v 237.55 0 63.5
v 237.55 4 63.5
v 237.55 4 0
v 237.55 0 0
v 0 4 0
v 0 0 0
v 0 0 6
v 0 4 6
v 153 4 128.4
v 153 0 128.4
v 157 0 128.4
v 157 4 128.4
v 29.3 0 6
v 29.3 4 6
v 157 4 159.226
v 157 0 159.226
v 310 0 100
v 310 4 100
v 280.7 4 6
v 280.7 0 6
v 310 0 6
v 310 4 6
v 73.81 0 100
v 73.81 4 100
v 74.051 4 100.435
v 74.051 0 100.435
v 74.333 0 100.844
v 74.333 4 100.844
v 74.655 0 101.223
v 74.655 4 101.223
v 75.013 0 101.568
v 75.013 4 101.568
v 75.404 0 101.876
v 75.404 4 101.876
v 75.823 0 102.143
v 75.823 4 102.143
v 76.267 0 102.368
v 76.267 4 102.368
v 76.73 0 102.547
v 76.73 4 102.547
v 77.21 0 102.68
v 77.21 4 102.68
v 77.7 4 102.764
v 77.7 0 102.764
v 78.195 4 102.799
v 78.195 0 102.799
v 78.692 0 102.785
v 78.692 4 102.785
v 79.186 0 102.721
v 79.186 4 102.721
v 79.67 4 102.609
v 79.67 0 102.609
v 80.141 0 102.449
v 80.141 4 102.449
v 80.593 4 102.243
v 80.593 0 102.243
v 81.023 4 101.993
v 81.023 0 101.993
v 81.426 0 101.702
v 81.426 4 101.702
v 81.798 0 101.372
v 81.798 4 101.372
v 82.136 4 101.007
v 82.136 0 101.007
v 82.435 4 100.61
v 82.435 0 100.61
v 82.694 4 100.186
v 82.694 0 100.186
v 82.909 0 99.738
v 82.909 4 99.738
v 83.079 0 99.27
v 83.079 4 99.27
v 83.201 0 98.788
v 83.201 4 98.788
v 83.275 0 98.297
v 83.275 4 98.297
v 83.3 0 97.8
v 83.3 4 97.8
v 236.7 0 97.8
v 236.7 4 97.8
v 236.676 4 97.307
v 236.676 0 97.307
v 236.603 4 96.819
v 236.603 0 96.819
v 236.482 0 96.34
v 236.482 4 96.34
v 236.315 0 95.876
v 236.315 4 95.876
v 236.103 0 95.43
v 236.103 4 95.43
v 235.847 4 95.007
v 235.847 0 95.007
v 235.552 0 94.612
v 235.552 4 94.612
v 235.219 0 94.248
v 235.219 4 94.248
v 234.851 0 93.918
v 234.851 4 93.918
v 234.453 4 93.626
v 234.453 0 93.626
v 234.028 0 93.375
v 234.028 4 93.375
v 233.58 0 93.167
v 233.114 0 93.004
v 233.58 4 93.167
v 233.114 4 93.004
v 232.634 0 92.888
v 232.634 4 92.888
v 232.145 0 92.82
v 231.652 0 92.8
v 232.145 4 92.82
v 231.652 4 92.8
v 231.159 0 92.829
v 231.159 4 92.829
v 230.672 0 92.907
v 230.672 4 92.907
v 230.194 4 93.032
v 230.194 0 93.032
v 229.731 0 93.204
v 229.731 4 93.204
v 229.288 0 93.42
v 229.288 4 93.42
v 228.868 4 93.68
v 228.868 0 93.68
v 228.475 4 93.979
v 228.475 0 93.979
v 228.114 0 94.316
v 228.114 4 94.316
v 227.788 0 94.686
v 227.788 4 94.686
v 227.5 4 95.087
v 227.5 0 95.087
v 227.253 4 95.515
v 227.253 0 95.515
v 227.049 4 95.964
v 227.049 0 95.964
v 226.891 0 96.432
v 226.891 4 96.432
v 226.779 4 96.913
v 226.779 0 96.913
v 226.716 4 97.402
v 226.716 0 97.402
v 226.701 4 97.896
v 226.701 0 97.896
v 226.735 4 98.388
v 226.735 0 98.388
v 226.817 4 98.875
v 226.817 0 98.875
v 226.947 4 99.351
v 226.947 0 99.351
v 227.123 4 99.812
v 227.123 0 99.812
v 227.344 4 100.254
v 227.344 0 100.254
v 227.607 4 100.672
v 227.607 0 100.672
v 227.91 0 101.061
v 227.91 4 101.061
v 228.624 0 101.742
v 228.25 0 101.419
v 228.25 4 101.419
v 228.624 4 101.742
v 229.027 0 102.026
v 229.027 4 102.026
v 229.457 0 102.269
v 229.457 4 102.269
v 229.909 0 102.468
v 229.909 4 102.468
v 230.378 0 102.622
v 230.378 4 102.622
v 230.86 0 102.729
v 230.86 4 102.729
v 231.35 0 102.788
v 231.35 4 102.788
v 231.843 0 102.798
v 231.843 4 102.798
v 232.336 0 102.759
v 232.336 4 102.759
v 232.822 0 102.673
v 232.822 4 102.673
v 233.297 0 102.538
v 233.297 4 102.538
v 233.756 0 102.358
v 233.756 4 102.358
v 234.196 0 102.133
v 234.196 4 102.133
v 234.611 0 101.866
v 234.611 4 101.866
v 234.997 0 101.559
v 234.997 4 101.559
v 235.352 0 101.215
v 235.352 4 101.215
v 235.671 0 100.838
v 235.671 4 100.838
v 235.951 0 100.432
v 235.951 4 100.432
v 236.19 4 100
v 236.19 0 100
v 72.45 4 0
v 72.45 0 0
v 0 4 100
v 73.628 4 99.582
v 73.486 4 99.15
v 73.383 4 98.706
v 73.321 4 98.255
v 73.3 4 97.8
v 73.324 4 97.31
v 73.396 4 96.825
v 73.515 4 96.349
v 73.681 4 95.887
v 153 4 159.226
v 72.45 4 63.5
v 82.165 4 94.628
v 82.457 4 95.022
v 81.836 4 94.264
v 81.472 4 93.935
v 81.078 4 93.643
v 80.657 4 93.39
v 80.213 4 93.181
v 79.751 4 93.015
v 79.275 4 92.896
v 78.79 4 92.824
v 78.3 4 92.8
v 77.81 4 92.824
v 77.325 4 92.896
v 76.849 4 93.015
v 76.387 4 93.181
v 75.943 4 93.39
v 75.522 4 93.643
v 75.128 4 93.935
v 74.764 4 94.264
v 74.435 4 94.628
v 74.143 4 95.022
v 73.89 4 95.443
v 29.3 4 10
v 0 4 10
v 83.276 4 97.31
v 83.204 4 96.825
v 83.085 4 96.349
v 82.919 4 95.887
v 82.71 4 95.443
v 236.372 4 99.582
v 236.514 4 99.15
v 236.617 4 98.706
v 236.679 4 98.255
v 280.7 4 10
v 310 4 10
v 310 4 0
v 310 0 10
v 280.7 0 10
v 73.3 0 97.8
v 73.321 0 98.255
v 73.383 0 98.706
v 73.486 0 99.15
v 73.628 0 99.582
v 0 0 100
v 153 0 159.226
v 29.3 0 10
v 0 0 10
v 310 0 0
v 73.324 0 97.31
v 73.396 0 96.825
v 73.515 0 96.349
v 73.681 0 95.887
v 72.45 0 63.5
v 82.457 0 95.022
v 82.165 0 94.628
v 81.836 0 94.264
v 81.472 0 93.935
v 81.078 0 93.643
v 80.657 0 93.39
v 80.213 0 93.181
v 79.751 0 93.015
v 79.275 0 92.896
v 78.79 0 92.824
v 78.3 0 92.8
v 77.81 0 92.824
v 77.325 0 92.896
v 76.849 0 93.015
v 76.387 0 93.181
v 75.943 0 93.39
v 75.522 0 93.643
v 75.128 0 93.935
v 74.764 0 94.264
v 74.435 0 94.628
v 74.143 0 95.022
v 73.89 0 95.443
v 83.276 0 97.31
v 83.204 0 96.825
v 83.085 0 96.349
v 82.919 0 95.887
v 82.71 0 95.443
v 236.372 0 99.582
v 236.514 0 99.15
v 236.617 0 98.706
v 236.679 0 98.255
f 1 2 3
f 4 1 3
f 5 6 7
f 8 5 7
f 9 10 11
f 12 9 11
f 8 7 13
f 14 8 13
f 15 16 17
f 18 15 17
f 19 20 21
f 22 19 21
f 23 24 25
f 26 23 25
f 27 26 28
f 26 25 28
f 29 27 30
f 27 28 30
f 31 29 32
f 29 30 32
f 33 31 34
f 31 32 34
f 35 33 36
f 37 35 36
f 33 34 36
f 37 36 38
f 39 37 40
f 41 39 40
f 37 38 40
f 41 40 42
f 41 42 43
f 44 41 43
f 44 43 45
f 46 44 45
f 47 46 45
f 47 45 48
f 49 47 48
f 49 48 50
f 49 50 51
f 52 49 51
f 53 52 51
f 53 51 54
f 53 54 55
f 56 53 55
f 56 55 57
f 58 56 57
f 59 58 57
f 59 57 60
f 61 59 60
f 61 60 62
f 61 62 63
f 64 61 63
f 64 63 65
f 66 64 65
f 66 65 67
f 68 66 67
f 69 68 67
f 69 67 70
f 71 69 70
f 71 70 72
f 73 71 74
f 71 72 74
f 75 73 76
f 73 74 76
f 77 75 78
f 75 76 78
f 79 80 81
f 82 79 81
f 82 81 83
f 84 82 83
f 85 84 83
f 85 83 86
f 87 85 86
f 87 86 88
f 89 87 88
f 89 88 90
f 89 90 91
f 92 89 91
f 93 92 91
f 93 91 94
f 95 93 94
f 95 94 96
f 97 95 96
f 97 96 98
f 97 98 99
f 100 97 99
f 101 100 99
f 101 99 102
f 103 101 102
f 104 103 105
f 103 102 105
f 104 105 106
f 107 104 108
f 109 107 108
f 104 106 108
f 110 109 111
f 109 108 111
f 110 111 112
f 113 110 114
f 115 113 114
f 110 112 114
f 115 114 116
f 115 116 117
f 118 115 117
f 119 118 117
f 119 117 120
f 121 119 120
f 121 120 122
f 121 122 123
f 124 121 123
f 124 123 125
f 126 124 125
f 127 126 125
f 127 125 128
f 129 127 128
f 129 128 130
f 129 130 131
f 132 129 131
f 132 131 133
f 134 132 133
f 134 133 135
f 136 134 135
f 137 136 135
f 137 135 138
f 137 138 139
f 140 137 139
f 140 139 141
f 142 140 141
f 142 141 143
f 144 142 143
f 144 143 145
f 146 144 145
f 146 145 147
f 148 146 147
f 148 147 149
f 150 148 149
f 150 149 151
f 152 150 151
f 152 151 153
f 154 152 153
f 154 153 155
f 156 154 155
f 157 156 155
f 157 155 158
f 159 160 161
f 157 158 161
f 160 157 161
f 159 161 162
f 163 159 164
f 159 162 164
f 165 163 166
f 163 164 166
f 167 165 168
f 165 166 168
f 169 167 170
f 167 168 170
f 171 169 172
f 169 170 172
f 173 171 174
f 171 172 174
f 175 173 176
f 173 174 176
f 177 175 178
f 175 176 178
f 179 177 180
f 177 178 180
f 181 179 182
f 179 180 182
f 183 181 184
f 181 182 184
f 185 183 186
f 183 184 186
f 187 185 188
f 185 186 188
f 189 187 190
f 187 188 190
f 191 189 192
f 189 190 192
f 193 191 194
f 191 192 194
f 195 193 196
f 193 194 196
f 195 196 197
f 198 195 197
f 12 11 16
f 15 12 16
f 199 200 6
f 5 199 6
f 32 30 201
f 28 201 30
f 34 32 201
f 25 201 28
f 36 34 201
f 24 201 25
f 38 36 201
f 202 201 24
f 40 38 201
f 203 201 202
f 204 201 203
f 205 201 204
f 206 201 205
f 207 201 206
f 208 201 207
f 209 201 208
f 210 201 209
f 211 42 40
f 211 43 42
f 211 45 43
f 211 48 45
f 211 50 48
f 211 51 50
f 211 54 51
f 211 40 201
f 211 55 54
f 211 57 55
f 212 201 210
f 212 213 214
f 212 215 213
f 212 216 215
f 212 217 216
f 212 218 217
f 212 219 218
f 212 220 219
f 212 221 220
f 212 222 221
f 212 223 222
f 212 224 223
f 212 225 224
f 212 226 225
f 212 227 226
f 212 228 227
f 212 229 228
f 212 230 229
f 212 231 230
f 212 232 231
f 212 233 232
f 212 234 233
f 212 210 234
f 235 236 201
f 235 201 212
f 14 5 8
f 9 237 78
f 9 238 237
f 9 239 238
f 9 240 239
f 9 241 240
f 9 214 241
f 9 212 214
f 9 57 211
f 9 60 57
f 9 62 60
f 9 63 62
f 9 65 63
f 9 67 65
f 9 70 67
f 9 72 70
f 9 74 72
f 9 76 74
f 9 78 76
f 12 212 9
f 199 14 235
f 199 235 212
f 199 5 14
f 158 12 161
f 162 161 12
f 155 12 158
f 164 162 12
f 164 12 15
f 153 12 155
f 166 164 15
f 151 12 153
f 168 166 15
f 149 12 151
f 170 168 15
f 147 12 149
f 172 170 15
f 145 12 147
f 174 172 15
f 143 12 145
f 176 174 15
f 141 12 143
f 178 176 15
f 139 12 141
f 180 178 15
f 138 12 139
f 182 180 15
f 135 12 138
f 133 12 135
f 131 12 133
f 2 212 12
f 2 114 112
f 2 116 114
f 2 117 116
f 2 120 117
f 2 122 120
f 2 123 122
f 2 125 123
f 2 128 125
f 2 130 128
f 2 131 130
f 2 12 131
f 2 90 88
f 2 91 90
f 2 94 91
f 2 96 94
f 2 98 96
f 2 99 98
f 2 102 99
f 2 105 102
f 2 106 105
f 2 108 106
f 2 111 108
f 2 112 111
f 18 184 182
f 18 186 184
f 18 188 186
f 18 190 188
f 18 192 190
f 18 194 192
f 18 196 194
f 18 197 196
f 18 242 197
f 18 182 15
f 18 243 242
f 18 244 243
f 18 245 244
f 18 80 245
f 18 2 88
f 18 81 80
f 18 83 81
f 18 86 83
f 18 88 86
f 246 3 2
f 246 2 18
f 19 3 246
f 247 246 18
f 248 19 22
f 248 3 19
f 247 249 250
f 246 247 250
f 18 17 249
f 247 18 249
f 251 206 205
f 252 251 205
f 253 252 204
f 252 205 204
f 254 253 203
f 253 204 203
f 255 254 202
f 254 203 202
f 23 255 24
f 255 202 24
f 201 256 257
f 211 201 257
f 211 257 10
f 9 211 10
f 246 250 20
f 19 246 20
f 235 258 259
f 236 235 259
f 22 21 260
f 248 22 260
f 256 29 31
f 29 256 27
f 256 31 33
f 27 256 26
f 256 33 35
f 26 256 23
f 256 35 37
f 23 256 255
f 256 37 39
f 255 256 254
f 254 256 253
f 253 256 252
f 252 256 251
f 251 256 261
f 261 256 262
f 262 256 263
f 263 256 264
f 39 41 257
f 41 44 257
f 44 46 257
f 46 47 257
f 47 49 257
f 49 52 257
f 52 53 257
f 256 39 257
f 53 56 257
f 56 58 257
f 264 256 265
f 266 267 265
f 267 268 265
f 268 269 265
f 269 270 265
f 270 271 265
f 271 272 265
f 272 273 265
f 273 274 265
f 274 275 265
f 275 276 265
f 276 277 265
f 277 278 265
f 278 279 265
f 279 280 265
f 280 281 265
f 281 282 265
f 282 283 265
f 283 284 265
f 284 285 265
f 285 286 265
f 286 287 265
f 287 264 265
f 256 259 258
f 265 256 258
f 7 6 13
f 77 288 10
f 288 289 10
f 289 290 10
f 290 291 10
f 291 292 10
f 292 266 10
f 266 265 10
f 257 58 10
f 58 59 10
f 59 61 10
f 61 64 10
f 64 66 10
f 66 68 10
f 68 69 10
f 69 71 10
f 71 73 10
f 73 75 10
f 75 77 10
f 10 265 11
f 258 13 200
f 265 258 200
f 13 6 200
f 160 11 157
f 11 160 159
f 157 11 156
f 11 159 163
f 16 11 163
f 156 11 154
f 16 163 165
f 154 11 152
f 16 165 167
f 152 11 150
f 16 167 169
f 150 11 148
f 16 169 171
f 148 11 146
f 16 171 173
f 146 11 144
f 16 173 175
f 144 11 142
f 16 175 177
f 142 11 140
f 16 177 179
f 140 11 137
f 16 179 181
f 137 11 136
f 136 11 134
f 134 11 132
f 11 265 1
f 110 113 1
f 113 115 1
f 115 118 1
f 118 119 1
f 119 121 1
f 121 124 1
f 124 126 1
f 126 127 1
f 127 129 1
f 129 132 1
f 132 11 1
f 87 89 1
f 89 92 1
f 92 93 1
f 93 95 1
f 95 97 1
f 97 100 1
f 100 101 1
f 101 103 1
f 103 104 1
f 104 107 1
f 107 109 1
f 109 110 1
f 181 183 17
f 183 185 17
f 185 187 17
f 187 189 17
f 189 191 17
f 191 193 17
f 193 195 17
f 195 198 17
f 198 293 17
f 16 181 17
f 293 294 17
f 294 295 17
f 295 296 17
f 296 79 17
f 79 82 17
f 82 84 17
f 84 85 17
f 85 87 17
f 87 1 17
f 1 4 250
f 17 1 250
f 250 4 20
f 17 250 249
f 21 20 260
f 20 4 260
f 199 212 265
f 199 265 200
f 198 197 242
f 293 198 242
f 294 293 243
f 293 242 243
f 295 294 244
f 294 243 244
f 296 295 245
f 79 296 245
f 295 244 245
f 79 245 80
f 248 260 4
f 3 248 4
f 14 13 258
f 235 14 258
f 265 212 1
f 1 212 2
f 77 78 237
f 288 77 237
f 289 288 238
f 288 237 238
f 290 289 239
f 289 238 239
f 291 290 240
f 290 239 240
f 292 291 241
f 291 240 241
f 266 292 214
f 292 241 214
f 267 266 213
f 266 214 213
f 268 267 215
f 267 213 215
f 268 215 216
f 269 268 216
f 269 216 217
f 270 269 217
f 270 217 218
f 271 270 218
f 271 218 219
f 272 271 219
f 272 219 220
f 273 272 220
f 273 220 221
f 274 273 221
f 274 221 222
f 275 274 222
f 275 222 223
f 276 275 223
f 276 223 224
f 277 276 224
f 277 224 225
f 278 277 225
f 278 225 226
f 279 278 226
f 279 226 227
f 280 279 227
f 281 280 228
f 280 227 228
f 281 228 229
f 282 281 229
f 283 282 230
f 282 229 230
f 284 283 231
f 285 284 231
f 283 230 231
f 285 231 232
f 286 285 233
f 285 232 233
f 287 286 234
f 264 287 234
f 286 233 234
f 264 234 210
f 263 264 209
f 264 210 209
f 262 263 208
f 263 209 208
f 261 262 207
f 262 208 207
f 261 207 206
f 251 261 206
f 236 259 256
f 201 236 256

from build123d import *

# Parameters (mm, degrees)
BOSS_EXTRUDE1_DEPTH = 4
SKETCH2_W           = 165.1
SKETCH2_H           = 63.5
CUT_EXTRUDE1_DEPTH  = 349.523826216
CUT_EXTRUDE2_DEPTH  = 10


with BuildPart() as part:
    # Sketch1 → Boss-Extrude1 (new body)
    with BuildSketch(Plane(origin=(0, 0, 0), x_dir=(1, 0, 0), z_dir=(0, 1, 0))):
        Polygon((310, -100), (310, -10), (280.7, -10), (280.7, -6), (310, -6), (310, 0), (0, 0), (0, -6), (29.3, -6), (29.3, -10), (0, -10), (0, -100), (153, -159.225806452), (153, -128.4), (157, -128.4), (157, -159.225806452), align=None)
    extrude(amount=BOSS_EXTRUDE1_DEPTH)

    # Sketch2 → Cut-Extrude1 (cut, through all)
    with BuildSketch(Plane(origin=(0, 4, 0), x_dir=(1, 0, 0), z_dir=(0, 1, 0))):
        with Locations((155, -31.75)):
            Rectangle(SKETCH2_W, SKETCH2_H)
    extrude(amount=-CUT_EXTRUDE1_DEPTH, mode=Mode.SUBTRACT)

    # Sketch4 → Cut-Extrude2 (cut)
    with BuildSketch(Plane(origin=(0, 4, 0), x_dir=(1, 0, 0), z_dir=(0, 1, 0))):
        with BuildLine():
            ThreePointArc((73.3, -97.8), (73.429171307, -98.929171307), (73.810011136, -100))
            Line((73.810011136, -100), (78.3, -100))
            Line((78.3, -100), (78.3, -97.8))
            Line((78.3, -97.8), (73.3, -97.8))
        make_face()
        with BuildLine():
            Line((78.3, -100), (73.810011136, -100))
            ThreePointArc((73.810011136, -100), (79.429171307, -102.670828693), (83.3, -97.8))
            ThreePointArc((83.3, -97.8), (78.3, -92.8), (73.3, -97.8))
            Line((73.3, -97.8), (78.3, -97.8))
            Line((78.3, -97.8), (78.3, -100))
        make_face()
        with BuildLine():
            Line((236.189988864, -100), (231.7, -100))
            Line((231.7, -100), (231.7, -97.8))
            Line((231.7, -97.8), (236.7, -97.8))
            ThreePointArc((236.7, -97.8), (226.829171307, -96.670828693), (236.189988864, -100))
        make_face()
        with BuildLine():
            Line((231.7, -97.8), (231.7, -100))
            Line((231.7, -100), (236.189988864, -100))
            ThreePointArc((236.189988864, -100), (236.570828693, -98.929171307), (236.7, -97.8))
            Line((236.7, -97.8), (231.7, -97.8))
        make_face()
    extrude(amount=-CUT_EXTRUDE2_DEPTH, mode=Mode.SUBTRACT)


solid = part.part
